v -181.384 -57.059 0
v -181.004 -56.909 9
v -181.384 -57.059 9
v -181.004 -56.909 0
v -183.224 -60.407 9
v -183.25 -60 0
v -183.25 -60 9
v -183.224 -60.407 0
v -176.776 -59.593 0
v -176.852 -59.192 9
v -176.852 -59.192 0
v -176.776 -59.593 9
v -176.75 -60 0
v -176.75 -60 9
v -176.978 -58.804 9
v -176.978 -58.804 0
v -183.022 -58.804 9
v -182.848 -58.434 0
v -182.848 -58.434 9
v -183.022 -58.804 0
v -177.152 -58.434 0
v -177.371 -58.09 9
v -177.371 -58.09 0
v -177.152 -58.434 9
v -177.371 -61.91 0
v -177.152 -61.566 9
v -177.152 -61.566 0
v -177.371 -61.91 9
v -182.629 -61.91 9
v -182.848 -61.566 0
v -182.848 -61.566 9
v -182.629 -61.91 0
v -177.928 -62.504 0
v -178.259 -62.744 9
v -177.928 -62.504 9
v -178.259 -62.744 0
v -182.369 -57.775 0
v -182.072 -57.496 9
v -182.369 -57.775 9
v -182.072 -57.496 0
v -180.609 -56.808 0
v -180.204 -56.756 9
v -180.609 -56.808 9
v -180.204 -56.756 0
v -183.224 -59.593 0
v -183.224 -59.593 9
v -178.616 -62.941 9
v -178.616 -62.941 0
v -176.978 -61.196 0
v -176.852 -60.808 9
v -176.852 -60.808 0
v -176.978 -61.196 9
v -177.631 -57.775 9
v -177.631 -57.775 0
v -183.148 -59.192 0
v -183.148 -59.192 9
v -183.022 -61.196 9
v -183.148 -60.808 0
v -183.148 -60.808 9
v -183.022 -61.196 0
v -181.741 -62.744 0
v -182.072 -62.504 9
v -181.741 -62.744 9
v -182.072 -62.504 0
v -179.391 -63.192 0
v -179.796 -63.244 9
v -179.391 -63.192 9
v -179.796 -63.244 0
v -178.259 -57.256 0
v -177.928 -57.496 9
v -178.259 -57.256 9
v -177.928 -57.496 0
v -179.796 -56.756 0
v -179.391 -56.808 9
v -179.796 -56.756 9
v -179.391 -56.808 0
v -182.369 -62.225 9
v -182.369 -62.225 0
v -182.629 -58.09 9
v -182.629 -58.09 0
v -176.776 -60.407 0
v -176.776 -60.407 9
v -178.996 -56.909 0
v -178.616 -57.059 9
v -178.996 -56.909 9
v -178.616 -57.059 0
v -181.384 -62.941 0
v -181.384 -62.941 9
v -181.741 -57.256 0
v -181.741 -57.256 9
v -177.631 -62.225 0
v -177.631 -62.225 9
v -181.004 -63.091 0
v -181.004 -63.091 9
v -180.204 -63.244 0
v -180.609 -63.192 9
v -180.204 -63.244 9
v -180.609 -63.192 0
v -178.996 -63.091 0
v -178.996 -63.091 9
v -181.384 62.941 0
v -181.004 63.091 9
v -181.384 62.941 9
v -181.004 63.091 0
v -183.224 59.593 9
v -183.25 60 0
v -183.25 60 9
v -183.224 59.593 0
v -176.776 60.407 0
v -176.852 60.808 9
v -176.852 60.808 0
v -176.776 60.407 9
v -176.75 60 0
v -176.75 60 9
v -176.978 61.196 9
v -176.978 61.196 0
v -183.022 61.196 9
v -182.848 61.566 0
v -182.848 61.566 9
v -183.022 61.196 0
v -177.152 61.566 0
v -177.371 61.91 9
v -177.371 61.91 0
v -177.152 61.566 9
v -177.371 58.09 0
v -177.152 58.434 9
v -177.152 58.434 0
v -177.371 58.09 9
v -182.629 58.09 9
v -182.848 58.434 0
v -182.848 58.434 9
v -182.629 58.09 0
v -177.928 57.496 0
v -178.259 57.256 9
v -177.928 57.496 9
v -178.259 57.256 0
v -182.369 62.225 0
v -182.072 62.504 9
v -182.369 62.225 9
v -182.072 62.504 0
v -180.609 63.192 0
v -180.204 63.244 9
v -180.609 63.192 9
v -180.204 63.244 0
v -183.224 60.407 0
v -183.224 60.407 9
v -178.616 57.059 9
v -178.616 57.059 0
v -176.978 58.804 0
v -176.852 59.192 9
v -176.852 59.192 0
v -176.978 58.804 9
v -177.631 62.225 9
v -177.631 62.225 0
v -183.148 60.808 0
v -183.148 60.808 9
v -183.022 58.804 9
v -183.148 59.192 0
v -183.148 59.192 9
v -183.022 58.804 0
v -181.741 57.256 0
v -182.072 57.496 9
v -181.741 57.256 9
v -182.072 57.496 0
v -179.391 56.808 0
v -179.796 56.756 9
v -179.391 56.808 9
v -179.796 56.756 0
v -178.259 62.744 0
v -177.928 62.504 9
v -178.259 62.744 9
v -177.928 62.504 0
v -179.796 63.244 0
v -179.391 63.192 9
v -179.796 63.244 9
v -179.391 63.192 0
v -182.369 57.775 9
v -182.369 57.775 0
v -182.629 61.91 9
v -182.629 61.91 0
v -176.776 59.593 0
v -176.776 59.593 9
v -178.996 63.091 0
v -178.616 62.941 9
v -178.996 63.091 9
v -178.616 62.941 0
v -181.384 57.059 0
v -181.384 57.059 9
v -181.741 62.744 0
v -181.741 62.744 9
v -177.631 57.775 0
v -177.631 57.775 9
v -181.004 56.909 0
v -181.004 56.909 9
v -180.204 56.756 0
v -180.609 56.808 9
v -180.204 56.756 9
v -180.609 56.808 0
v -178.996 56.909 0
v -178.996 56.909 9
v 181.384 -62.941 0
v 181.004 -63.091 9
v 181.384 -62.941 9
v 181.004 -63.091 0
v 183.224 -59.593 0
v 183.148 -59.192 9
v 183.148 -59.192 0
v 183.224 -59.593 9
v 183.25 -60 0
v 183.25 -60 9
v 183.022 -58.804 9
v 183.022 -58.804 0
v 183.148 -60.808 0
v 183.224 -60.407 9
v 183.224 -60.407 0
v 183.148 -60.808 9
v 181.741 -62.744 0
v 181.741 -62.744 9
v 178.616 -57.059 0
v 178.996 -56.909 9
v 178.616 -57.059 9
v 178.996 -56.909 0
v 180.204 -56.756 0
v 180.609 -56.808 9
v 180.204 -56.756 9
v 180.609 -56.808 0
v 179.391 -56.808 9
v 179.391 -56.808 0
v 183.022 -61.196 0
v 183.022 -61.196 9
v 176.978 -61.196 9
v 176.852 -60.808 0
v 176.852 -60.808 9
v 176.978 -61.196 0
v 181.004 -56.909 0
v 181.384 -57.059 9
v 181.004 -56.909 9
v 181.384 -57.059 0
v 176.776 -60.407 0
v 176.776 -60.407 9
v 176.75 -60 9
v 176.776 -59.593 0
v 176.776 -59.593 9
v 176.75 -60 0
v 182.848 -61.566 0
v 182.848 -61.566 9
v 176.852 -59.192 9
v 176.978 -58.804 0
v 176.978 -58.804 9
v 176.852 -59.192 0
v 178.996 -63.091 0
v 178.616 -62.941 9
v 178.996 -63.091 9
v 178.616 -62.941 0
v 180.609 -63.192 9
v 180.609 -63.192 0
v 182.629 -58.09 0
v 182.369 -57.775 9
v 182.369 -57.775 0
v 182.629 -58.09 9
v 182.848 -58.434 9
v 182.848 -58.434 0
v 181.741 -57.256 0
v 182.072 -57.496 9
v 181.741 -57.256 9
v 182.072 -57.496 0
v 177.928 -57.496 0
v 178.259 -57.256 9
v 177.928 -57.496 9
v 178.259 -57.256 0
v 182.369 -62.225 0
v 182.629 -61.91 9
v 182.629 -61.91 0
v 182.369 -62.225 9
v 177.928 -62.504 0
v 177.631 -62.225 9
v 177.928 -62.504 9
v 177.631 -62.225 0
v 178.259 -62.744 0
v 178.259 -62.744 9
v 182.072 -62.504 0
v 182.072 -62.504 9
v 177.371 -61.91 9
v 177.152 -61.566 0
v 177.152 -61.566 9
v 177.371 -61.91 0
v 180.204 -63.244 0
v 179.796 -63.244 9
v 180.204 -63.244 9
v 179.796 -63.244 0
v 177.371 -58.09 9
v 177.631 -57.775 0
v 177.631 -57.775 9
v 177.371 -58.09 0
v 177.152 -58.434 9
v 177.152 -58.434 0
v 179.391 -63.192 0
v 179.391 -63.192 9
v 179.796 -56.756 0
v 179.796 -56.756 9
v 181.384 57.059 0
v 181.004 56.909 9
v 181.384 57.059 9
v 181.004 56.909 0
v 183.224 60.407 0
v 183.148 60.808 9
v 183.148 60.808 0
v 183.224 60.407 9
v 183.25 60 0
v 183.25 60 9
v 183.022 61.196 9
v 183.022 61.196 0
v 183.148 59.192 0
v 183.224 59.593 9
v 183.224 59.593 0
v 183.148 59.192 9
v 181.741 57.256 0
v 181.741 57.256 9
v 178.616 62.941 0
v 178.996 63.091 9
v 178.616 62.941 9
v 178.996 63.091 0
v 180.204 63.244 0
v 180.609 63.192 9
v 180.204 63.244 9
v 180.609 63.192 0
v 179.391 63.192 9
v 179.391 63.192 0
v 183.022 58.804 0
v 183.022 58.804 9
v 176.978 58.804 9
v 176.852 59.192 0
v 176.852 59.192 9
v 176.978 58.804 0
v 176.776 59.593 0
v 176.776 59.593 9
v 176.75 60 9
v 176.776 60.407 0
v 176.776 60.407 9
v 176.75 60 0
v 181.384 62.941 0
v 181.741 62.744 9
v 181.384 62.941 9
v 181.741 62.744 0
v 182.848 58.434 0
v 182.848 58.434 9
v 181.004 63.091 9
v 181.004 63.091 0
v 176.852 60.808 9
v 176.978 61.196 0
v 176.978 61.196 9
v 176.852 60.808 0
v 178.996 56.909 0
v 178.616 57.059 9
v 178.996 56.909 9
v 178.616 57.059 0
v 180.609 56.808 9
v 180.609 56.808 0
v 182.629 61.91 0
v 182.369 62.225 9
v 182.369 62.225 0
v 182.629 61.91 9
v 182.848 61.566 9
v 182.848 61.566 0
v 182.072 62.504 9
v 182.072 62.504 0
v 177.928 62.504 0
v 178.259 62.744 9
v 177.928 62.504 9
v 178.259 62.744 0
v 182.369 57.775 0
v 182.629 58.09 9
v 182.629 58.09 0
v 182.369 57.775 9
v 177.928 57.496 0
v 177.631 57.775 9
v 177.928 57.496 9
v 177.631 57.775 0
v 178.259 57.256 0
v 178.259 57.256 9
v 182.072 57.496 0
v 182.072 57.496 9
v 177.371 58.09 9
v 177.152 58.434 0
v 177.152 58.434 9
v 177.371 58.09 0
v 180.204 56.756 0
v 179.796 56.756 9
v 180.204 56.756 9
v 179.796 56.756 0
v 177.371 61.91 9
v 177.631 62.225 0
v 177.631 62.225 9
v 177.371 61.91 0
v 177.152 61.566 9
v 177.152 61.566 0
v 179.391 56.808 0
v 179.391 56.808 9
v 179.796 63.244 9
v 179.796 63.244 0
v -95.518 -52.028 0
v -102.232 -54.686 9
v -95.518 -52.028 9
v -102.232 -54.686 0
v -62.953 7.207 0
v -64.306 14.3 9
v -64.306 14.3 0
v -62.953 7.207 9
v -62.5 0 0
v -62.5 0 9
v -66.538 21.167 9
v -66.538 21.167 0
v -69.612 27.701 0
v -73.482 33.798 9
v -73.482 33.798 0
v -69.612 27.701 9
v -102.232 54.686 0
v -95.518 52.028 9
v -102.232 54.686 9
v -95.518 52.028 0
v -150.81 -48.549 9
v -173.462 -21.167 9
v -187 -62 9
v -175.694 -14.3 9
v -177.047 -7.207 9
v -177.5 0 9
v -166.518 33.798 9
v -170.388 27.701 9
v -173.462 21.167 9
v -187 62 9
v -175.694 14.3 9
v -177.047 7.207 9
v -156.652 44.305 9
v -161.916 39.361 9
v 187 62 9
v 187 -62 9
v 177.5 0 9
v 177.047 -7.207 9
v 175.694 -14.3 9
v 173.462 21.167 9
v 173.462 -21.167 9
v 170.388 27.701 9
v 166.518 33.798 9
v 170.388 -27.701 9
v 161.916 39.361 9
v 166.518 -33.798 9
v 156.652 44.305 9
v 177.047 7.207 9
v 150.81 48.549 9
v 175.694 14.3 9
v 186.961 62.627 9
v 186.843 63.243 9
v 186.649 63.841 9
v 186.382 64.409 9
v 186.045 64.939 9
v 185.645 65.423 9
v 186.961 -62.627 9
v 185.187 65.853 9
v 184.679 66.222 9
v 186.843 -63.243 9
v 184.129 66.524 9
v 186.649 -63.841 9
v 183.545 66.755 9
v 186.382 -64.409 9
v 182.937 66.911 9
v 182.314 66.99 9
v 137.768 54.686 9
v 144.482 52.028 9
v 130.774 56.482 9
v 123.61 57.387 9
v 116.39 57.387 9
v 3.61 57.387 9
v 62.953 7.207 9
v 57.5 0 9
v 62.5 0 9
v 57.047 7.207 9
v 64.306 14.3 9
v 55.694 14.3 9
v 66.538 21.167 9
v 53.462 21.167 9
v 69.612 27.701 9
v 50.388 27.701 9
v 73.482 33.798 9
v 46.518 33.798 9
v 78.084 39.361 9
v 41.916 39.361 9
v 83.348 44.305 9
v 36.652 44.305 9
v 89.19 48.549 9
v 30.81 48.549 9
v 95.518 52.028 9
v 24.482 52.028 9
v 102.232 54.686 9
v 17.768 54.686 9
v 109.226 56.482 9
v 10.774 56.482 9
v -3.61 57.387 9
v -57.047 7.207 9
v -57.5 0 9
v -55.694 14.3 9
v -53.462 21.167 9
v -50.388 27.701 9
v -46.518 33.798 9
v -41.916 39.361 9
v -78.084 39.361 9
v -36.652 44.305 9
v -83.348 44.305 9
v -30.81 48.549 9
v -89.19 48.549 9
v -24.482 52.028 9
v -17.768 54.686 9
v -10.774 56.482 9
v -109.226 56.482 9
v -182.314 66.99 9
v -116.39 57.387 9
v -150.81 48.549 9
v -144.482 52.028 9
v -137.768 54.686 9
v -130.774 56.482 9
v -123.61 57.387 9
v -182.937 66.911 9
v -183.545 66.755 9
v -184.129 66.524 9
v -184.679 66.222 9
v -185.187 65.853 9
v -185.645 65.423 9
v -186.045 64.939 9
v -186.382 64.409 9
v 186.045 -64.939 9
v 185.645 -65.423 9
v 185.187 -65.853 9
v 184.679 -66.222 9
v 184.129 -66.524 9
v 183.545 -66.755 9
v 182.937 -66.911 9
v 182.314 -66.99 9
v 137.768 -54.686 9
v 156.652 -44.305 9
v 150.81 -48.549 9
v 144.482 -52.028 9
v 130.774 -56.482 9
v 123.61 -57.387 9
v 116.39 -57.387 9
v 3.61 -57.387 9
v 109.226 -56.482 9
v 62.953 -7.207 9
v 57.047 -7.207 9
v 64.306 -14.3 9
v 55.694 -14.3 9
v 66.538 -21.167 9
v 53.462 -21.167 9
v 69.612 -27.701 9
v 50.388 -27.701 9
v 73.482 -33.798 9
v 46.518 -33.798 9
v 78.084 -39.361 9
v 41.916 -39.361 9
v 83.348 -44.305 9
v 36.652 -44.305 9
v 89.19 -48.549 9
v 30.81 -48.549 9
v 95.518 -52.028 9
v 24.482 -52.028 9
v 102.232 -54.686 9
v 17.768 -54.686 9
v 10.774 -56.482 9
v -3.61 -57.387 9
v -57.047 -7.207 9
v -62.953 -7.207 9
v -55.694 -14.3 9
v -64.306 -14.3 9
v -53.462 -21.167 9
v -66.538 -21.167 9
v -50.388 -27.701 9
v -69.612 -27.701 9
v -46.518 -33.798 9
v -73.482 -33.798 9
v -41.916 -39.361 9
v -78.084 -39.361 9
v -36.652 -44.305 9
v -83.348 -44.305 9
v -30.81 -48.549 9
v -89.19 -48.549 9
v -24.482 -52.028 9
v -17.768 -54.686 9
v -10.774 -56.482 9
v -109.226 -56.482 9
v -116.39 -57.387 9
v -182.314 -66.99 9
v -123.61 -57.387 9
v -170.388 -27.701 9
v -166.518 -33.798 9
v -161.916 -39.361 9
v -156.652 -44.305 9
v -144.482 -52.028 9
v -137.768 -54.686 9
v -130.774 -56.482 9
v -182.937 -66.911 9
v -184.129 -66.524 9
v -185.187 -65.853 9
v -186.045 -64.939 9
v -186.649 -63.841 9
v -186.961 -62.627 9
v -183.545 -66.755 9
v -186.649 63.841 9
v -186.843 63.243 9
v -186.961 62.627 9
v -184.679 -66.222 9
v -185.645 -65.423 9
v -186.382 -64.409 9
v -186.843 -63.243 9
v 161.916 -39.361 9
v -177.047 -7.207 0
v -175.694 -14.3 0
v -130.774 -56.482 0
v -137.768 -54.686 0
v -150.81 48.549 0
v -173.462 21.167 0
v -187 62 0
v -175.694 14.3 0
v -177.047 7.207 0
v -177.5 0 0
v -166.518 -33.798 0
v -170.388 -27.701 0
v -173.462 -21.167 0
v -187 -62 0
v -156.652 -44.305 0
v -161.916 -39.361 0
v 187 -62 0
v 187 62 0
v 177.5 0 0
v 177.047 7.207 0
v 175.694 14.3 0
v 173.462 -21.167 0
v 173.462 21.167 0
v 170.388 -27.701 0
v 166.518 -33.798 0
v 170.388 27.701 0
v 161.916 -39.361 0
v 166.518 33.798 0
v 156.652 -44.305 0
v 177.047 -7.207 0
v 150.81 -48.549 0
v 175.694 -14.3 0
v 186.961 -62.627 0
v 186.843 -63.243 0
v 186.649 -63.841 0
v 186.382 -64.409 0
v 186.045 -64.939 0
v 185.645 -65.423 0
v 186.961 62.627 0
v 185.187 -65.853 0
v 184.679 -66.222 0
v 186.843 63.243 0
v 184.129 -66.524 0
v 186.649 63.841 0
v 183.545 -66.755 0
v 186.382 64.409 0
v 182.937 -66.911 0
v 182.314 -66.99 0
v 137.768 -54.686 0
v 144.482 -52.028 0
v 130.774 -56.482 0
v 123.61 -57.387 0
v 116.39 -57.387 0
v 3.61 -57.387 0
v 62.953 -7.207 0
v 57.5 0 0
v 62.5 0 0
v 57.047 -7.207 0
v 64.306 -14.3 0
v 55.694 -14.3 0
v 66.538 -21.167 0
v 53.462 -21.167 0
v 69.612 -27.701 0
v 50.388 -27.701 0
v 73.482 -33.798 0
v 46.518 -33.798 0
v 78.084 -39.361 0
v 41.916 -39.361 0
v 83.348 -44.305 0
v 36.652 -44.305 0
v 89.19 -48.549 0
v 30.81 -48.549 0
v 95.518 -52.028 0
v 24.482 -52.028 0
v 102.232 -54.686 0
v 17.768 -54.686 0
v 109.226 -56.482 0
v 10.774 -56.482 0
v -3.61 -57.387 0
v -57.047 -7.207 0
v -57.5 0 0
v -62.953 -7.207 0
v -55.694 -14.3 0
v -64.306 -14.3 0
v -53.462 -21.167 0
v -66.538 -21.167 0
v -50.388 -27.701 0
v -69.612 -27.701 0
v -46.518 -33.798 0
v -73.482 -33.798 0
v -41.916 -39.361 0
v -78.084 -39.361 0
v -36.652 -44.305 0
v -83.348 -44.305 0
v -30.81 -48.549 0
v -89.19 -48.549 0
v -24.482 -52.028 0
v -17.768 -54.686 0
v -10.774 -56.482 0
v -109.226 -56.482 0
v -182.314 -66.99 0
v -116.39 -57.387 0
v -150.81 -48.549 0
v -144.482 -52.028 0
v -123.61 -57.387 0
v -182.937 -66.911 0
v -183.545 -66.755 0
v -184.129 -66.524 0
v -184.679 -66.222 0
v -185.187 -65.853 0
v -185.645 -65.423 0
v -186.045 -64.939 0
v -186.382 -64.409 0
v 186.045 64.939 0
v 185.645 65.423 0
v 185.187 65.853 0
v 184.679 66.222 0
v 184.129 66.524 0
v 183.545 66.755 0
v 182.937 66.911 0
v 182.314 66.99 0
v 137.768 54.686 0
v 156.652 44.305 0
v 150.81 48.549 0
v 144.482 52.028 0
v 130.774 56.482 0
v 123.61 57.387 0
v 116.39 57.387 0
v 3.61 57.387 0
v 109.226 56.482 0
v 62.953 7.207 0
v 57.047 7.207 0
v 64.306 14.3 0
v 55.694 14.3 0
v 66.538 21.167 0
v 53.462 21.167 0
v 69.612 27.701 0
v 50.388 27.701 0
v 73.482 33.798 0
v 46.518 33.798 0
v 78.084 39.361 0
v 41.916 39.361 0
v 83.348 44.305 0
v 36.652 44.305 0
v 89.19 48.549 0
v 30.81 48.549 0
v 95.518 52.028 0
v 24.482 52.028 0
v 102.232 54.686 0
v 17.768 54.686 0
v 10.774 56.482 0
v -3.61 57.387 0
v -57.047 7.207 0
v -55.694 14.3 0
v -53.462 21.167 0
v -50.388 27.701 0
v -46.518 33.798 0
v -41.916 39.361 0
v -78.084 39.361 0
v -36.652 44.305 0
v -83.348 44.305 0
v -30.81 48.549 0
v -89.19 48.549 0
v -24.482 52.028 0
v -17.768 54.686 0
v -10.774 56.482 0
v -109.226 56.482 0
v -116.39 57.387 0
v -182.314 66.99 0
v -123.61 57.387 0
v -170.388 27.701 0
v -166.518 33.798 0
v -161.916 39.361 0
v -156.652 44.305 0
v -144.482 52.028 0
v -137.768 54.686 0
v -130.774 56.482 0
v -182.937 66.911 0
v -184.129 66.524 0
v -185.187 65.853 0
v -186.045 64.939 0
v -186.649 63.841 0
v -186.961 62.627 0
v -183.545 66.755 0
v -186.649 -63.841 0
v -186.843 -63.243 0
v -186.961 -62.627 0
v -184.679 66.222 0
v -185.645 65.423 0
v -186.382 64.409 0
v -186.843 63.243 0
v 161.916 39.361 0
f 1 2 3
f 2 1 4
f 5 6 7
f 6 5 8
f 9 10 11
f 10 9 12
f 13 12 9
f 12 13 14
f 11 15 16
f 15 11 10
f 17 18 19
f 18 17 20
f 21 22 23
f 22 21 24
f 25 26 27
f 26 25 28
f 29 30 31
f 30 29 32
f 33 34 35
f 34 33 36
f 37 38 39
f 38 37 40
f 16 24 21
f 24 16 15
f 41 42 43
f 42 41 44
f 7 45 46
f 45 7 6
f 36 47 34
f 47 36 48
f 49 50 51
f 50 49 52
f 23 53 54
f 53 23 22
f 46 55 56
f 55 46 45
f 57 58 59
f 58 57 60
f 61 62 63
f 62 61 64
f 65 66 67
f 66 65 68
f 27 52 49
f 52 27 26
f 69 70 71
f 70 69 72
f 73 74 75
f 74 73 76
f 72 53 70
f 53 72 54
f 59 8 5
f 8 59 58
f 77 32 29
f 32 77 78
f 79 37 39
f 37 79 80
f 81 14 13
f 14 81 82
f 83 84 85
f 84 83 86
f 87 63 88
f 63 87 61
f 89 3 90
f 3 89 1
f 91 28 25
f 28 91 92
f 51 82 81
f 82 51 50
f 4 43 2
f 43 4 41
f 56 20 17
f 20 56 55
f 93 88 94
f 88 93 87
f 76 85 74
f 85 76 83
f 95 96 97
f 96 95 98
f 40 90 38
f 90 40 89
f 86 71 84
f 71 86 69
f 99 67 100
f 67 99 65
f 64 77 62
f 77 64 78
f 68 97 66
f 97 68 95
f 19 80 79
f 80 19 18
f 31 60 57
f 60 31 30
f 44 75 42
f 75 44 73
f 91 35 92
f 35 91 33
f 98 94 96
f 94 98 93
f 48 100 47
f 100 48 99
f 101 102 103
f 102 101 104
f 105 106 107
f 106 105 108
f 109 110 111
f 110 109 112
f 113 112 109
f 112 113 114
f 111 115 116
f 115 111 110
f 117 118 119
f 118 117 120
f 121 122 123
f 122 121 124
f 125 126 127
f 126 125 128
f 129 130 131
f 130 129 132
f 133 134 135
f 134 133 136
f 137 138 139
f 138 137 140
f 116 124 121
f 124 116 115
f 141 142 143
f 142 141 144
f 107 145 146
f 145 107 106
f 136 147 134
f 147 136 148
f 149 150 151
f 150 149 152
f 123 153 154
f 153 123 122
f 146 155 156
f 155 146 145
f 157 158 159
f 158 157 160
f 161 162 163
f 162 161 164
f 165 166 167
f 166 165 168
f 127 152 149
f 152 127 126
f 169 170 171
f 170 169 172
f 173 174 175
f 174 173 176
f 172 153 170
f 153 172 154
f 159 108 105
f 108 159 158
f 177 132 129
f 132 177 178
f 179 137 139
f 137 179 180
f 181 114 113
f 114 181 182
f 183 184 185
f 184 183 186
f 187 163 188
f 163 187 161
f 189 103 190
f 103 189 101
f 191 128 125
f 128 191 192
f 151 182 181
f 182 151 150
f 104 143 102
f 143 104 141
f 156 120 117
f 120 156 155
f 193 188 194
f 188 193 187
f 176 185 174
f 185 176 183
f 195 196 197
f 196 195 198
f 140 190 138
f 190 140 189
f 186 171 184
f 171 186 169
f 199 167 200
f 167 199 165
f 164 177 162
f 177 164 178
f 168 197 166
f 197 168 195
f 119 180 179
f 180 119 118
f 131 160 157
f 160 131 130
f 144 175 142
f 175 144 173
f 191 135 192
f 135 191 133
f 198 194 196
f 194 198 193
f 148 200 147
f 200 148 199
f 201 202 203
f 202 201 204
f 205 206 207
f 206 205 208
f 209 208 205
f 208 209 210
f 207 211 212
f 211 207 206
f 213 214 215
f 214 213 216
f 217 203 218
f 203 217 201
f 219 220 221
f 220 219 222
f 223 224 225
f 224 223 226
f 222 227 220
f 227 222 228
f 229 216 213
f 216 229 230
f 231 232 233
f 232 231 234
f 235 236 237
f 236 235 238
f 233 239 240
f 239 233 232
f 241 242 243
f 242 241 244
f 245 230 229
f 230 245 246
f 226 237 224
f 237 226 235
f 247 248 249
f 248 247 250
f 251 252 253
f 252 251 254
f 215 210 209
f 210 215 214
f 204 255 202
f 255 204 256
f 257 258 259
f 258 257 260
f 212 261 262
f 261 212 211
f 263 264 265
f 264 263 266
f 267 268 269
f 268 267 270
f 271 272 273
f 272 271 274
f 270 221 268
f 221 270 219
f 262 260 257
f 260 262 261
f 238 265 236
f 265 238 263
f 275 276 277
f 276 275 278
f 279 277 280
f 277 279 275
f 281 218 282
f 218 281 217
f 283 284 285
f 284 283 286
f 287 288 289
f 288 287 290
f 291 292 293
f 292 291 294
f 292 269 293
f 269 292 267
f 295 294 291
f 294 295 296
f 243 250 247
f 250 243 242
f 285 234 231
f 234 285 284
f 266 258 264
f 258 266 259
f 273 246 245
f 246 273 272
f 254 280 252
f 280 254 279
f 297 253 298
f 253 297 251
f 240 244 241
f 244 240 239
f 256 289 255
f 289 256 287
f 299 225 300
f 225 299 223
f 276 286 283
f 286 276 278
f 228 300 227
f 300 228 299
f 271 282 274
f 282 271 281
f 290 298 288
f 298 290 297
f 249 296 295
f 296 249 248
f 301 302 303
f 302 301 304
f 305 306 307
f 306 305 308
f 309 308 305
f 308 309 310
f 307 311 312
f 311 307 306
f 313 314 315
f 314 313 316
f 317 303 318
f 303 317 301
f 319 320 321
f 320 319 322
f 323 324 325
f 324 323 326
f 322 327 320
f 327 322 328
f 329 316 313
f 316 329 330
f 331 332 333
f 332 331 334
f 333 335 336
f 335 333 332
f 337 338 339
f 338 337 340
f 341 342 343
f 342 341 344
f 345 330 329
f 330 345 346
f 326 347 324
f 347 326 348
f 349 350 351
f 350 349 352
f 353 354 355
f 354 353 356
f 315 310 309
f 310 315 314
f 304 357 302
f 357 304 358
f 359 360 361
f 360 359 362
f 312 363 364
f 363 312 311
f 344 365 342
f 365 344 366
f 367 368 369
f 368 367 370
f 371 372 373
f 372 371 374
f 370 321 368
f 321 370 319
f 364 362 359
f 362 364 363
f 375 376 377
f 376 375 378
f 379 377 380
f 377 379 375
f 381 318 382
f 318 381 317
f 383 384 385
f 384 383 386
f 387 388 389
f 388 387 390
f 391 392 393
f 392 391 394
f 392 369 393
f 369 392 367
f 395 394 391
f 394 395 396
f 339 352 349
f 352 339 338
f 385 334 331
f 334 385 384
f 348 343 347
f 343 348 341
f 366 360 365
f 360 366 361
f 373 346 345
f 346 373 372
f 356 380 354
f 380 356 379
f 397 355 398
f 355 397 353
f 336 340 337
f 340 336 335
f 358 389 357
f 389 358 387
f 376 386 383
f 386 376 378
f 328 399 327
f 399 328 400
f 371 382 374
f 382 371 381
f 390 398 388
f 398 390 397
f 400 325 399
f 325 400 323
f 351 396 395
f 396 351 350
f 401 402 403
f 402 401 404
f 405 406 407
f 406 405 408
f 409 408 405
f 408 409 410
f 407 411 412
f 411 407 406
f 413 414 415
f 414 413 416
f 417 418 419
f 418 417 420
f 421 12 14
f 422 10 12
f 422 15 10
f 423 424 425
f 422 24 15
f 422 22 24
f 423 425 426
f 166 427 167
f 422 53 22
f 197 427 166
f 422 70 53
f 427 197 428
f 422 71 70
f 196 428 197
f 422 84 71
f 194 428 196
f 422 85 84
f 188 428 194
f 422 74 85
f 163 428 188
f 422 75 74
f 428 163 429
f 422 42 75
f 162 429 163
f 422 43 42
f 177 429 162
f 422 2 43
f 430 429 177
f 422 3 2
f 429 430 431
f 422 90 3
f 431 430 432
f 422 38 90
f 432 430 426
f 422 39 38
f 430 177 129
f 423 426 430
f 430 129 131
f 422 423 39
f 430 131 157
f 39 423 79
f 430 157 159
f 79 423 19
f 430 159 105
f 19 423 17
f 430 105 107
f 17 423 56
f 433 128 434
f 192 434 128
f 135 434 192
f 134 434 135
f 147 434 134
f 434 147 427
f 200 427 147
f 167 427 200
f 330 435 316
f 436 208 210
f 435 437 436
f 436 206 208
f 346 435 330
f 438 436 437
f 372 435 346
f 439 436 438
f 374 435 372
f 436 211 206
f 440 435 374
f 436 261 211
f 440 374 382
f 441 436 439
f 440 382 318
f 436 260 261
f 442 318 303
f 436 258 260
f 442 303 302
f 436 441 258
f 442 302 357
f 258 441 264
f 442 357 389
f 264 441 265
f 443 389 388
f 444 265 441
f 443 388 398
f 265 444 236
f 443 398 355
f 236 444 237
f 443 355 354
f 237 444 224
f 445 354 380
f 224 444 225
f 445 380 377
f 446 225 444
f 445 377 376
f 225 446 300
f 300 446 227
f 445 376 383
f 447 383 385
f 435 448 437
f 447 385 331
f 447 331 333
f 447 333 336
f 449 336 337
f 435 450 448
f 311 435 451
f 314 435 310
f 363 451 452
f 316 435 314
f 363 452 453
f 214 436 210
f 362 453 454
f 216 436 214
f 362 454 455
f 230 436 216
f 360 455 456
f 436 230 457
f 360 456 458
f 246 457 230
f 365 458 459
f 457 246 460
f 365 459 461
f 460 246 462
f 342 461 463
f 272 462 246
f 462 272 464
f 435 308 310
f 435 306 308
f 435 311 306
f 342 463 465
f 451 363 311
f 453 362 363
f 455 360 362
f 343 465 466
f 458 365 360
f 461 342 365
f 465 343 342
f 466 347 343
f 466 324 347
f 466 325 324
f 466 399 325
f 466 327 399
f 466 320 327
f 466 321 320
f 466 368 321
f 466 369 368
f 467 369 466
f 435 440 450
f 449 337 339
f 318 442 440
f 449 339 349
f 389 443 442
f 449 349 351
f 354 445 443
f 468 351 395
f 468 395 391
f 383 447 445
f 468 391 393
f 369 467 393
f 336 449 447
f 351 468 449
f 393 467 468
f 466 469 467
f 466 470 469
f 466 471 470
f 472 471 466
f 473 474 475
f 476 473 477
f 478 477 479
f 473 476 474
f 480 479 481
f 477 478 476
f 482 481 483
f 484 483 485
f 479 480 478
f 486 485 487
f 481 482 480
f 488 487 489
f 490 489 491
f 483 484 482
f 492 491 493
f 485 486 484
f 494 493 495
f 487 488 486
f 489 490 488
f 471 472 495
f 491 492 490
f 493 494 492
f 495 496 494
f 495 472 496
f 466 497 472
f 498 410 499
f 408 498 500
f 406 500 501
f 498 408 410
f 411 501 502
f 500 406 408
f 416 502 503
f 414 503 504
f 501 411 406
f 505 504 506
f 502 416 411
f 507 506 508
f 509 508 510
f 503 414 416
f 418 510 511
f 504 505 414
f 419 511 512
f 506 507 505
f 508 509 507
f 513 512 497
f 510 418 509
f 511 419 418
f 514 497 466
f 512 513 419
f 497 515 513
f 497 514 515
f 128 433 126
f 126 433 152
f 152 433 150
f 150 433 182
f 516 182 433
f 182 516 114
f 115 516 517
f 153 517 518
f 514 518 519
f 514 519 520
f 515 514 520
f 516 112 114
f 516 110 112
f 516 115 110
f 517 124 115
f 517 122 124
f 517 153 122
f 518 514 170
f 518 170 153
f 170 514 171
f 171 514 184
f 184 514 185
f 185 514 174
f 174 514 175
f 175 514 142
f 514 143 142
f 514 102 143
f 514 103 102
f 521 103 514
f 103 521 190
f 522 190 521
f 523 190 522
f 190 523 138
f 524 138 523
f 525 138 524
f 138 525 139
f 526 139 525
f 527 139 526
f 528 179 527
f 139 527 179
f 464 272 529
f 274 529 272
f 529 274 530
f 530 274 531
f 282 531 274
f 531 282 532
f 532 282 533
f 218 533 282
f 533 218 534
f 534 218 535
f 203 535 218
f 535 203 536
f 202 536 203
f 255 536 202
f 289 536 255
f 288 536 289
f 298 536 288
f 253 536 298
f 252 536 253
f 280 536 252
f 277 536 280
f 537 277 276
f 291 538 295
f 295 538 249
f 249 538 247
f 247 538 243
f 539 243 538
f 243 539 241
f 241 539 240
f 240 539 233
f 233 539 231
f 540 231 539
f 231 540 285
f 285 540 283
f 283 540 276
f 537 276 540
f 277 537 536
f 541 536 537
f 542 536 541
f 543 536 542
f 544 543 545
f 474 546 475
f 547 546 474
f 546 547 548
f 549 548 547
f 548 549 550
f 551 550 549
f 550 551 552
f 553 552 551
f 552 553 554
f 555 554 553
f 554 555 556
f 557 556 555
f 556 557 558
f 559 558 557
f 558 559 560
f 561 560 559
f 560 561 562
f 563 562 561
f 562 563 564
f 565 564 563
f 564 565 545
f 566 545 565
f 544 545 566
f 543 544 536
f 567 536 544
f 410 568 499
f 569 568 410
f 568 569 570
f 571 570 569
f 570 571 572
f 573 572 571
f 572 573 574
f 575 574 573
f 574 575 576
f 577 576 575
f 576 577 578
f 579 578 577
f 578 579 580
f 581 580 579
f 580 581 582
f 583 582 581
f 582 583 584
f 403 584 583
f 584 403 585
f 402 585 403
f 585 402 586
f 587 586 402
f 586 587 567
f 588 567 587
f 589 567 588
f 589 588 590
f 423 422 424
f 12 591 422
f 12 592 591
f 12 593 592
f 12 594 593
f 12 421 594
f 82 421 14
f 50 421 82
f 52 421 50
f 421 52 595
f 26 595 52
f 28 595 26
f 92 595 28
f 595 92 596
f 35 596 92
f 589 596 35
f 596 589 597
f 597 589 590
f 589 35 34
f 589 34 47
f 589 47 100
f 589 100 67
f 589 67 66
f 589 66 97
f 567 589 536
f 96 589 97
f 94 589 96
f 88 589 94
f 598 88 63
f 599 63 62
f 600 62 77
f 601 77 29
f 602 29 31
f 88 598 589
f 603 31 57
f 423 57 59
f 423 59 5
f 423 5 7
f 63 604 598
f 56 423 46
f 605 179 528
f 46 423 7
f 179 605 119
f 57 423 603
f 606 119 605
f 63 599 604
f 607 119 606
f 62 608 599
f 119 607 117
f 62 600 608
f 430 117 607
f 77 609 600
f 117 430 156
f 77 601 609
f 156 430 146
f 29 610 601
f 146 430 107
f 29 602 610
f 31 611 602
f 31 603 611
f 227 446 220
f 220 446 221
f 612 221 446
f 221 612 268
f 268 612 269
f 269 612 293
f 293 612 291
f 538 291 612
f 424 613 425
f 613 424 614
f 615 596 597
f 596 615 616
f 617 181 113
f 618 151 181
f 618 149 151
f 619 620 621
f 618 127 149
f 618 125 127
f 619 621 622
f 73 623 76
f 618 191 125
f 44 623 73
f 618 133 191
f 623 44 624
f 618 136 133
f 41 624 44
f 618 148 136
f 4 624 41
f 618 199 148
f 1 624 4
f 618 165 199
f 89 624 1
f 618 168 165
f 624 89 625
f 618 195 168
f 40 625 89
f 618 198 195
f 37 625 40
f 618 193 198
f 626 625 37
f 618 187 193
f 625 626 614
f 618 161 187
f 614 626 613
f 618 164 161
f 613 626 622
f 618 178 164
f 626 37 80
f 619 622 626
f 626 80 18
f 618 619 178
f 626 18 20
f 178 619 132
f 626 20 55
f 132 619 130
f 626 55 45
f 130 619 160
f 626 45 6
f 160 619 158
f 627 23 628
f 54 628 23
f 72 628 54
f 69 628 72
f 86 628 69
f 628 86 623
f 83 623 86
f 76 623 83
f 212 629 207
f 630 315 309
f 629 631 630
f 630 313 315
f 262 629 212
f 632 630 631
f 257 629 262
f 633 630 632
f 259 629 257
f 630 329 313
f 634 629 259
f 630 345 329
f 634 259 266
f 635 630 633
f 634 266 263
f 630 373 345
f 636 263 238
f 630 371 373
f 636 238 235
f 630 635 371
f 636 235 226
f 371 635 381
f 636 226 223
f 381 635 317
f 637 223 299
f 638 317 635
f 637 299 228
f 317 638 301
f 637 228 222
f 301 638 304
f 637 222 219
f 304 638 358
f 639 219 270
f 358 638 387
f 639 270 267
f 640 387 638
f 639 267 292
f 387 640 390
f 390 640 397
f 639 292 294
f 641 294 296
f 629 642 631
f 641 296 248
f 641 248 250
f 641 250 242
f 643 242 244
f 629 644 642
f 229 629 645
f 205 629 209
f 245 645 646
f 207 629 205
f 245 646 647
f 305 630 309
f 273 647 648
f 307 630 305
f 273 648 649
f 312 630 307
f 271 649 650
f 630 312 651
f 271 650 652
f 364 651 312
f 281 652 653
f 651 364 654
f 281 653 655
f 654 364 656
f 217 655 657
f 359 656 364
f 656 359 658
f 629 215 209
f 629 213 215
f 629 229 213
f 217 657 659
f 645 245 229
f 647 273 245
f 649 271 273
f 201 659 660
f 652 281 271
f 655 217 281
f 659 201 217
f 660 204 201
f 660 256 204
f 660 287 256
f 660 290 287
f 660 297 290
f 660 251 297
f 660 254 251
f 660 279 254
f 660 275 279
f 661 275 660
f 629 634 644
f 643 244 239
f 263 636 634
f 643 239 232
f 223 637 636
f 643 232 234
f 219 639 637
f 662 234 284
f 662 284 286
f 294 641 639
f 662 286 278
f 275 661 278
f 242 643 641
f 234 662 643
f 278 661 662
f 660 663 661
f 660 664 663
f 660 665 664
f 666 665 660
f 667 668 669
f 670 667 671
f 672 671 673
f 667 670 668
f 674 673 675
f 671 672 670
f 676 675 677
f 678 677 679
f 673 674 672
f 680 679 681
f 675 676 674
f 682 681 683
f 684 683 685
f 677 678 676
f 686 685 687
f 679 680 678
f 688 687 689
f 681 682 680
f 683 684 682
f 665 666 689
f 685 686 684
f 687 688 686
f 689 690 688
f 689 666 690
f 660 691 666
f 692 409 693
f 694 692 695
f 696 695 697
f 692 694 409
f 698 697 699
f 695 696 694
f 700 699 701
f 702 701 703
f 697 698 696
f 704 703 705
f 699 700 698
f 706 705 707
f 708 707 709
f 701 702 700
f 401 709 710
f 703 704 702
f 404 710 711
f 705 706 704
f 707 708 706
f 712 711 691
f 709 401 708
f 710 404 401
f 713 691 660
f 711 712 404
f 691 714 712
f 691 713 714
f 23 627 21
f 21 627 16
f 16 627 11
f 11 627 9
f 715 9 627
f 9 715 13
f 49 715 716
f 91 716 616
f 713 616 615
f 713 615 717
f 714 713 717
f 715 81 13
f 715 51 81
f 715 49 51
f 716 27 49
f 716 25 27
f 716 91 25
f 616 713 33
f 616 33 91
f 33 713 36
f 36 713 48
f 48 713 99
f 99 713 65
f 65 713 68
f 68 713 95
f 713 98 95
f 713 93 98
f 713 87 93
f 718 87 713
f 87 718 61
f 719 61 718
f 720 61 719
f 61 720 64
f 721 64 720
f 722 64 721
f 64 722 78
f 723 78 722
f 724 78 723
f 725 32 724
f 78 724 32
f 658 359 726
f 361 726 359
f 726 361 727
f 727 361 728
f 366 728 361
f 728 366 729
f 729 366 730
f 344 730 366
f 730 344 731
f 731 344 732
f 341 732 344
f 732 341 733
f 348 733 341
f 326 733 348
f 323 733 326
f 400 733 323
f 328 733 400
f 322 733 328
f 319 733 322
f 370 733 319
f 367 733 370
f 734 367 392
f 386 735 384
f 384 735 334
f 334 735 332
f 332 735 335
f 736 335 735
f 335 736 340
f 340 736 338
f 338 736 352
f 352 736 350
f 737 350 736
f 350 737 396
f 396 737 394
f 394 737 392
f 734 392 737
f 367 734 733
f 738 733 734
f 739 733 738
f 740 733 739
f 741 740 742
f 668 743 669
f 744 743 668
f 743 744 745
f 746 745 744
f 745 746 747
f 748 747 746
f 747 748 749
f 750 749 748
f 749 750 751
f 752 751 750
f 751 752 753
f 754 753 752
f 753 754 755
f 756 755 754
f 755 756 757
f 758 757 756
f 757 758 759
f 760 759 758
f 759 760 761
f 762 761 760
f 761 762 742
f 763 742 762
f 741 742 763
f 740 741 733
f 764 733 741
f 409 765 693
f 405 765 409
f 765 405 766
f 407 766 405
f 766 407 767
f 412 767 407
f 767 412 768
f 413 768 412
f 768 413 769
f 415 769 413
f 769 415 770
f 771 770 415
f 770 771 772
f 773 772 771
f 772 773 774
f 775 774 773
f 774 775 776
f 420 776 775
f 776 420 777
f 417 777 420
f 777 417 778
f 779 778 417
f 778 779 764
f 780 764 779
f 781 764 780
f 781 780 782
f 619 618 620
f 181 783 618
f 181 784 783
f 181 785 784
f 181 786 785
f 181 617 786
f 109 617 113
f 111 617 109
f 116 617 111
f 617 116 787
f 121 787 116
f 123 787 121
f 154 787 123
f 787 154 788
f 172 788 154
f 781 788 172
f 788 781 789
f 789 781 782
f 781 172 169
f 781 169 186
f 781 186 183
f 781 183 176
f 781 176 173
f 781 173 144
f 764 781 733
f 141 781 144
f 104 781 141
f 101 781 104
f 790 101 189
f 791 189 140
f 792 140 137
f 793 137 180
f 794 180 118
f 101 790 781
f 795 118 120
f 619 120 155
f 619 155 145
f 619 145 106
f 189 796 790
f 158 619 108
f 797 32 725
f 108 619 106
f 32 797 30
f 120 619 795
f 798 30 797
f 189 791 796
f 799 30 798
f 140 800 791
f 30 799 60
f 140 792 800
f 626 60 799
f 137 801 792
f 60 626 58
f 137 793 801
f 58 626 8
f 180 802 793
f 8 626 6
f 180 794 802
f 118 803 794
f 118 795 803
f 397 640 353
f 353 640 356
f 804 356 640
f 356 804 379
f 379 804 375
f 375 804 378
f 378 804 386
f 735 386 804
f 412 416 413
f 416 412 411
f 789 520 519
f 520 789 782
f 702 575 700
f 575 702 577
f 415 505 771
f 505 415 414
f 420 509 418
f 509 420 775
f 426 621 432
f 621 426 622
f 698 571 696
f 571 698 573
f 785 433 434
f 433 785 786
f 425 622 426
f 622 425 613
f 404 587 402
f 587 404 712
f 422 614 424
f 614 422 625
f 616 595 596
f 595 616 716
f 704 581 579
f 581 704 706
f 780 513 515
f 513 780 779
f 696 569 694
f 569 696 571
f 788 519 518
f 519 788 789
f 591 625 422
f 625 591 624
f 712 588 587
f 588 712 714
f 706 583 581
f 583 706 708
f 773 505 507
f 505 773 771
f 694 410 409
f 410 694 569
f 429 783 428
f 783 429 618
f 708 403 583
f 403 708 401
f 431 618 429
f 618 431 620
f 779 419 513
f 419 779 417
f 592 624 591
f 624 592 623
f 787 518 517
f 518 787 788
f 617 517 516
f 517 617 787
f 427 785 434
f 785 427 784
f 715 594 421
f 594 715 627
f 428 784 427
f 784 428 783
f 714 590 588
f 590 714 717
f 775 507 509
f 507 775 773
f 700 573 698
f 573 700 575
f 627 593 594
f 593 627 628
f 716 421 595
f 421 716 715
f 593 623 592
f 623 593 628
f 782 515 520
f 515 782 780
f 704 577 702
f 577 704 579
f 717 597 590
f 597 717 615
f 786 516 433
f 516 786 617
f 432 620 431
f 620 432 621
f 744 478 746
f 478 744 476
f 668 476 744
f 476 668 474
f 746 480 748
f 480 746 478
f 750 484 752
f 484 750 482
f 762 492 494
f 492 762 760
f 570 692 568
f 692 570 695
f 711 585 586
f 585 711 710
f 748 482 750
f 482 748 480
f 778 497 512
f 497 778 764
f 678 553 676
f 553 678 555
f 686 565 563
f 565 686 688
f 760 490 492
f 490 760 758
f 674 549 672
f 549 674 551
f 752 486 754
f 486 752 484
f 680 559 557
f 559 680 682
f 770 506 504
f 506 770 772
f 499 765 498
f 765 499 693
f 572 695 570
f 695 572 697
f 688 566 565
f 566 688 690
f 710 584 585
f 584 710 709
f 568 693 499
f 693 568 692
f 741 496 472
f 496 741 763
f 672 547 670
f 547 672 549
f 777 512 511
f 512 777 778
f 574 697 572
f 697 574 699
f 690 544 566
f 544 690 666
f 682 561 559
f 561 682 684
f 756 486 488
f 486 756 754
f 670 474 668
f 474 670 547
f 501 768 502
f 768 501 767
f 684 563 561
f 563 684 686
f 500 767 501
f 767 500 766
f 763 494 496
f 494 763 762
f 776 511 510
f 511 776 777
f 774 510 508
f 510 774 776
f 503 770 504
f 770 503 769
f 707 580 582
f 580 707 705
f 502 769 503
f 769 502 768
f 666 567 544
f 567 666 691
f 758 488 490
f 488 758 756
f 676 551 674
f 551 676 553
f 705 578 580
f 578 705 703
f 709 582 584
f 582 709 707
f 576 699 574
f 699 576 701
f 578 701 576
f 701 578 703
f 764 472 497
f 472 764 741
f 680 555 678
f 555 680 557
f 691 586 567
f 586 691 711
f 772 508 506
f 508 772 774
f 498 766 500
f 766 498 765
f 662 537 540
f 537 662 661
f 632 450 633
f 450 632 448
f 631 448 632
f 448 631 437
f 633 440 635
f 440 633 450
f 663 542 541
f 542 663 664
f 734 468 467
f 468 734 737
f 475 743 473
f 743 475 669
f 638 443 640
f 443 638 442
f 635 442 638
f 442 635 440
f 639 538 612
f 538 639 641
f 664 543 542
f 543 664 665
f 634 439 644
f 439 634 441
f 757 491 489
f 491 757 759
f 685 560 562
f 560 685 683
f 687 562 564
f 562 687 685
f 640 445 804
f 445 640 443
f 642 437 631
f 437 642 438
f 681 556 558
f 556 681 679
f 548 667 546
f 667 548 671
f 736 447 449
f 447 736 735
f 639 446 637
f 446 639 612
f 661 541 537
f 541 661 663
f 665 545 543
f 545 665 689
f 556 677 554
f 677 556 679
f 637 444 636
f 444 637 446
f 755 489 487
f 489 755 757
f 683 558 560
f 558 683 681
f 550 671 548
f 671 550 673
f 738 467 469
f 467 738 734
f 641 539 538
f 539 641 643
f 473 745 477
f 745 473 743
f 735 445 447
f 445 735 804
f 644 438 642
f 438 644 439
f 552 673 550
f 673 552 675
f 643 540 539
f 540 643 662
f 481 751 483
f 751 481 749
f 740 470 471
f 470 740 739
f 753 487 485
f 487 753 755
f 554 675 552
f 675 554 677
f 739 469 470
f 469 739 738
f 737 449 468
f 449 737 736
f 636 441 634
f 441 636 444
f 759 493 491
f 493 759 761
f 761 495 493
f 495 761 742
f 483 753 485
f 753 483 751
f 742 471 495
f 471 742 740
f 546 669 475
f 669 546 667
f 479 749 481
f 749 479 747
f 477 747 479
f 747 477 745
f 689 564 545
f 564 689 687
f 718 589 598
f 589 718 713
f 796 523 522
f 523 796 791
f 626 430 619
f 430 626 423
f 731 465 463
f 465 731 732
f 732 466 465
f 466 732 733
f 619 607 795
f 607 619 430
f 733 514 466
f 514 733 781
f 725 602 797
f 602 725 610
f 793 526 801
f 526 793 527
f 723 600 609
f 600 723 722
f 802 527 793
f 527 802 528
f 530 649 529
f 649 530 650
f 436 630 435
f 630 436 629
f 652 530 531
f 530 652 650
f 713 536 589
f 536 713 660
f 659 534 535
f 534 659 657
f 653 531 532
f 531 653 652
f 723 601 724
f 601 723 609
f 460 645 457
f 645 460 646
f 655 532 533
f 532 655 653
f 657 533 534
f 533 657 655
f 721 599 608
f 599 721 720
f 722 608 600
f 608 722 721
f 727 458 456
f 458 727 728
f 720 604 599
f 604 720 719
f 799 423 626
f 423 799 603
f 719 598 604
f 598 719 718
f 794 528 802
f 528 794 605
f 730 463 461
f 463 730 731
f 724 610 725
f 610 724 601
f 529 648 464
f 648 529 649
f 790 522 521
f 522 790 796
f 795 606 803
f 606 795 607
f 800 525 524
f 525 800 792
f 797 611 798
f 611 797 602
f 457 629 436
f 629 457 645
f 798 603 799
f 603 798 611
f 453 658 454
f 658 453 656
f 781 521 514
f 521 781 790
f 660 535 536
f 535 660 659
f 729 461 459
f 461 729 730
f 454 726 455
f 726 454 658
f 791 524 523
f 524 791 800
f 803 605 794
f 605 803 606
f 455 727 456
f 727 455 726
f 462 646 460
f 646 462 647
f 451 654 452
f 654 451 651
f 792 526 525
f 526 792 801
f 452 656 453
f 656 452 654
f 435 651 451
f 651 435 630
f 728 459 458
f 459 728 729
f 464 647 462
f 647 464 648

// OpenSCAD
$fn = 50;


difference() {
	union() {
		hull() {
			translate(v = [-182.0000000000, 62.0000000000, 0]) {
				cylinder(h = 9, r = 5);
			}
			translate(v = [182.0000000000, 62.0000000000, 0]) {
				cylinder(h = 9, r = 5);
			}
			translate(v = [-182.0000000000, -62.0000000000, 0]) {
				cylinder(h = 9, r = 5);
			}
			translate(v = [182.0000000000, -62.0000000000, 0]) {
				cylinder(h = 9, r = 5);
			}
		}
	}
	union() {
		#translate(v = [-180.0000000000, -60.0000000000, -100.0000000000]) {
			cylinder(h = 200, r = 3.2500000000);
		}
		#translate(v = [-180.0000000000, 60.0000000000, -100.0000000000]) {
			cylinder(h = 200, r = 3.2500000000);
		}
		#translate(v = [180.0000000000, -60.0000000000, -100.0000000000]) {
			cylinder(h = 200, r = 3.2500000000);
		}
		#translate(v = [180.0000000000, 60.0000000000, -100.0000000000]) {
			cylinder(h = 200, r = 3.2500000000);
		}
		#translate(v = [-120.0000000000, 0, 0]) {
			cylinder(h = 9, r = 57.5000000000);
		}
		#cylinder(h = 9, r = 57.5000000000);
		#translate(v = [120.0000000000, 0, 0]) {
			cylinder(h = 9, r = 57.5000000000);
		}
	}
}
